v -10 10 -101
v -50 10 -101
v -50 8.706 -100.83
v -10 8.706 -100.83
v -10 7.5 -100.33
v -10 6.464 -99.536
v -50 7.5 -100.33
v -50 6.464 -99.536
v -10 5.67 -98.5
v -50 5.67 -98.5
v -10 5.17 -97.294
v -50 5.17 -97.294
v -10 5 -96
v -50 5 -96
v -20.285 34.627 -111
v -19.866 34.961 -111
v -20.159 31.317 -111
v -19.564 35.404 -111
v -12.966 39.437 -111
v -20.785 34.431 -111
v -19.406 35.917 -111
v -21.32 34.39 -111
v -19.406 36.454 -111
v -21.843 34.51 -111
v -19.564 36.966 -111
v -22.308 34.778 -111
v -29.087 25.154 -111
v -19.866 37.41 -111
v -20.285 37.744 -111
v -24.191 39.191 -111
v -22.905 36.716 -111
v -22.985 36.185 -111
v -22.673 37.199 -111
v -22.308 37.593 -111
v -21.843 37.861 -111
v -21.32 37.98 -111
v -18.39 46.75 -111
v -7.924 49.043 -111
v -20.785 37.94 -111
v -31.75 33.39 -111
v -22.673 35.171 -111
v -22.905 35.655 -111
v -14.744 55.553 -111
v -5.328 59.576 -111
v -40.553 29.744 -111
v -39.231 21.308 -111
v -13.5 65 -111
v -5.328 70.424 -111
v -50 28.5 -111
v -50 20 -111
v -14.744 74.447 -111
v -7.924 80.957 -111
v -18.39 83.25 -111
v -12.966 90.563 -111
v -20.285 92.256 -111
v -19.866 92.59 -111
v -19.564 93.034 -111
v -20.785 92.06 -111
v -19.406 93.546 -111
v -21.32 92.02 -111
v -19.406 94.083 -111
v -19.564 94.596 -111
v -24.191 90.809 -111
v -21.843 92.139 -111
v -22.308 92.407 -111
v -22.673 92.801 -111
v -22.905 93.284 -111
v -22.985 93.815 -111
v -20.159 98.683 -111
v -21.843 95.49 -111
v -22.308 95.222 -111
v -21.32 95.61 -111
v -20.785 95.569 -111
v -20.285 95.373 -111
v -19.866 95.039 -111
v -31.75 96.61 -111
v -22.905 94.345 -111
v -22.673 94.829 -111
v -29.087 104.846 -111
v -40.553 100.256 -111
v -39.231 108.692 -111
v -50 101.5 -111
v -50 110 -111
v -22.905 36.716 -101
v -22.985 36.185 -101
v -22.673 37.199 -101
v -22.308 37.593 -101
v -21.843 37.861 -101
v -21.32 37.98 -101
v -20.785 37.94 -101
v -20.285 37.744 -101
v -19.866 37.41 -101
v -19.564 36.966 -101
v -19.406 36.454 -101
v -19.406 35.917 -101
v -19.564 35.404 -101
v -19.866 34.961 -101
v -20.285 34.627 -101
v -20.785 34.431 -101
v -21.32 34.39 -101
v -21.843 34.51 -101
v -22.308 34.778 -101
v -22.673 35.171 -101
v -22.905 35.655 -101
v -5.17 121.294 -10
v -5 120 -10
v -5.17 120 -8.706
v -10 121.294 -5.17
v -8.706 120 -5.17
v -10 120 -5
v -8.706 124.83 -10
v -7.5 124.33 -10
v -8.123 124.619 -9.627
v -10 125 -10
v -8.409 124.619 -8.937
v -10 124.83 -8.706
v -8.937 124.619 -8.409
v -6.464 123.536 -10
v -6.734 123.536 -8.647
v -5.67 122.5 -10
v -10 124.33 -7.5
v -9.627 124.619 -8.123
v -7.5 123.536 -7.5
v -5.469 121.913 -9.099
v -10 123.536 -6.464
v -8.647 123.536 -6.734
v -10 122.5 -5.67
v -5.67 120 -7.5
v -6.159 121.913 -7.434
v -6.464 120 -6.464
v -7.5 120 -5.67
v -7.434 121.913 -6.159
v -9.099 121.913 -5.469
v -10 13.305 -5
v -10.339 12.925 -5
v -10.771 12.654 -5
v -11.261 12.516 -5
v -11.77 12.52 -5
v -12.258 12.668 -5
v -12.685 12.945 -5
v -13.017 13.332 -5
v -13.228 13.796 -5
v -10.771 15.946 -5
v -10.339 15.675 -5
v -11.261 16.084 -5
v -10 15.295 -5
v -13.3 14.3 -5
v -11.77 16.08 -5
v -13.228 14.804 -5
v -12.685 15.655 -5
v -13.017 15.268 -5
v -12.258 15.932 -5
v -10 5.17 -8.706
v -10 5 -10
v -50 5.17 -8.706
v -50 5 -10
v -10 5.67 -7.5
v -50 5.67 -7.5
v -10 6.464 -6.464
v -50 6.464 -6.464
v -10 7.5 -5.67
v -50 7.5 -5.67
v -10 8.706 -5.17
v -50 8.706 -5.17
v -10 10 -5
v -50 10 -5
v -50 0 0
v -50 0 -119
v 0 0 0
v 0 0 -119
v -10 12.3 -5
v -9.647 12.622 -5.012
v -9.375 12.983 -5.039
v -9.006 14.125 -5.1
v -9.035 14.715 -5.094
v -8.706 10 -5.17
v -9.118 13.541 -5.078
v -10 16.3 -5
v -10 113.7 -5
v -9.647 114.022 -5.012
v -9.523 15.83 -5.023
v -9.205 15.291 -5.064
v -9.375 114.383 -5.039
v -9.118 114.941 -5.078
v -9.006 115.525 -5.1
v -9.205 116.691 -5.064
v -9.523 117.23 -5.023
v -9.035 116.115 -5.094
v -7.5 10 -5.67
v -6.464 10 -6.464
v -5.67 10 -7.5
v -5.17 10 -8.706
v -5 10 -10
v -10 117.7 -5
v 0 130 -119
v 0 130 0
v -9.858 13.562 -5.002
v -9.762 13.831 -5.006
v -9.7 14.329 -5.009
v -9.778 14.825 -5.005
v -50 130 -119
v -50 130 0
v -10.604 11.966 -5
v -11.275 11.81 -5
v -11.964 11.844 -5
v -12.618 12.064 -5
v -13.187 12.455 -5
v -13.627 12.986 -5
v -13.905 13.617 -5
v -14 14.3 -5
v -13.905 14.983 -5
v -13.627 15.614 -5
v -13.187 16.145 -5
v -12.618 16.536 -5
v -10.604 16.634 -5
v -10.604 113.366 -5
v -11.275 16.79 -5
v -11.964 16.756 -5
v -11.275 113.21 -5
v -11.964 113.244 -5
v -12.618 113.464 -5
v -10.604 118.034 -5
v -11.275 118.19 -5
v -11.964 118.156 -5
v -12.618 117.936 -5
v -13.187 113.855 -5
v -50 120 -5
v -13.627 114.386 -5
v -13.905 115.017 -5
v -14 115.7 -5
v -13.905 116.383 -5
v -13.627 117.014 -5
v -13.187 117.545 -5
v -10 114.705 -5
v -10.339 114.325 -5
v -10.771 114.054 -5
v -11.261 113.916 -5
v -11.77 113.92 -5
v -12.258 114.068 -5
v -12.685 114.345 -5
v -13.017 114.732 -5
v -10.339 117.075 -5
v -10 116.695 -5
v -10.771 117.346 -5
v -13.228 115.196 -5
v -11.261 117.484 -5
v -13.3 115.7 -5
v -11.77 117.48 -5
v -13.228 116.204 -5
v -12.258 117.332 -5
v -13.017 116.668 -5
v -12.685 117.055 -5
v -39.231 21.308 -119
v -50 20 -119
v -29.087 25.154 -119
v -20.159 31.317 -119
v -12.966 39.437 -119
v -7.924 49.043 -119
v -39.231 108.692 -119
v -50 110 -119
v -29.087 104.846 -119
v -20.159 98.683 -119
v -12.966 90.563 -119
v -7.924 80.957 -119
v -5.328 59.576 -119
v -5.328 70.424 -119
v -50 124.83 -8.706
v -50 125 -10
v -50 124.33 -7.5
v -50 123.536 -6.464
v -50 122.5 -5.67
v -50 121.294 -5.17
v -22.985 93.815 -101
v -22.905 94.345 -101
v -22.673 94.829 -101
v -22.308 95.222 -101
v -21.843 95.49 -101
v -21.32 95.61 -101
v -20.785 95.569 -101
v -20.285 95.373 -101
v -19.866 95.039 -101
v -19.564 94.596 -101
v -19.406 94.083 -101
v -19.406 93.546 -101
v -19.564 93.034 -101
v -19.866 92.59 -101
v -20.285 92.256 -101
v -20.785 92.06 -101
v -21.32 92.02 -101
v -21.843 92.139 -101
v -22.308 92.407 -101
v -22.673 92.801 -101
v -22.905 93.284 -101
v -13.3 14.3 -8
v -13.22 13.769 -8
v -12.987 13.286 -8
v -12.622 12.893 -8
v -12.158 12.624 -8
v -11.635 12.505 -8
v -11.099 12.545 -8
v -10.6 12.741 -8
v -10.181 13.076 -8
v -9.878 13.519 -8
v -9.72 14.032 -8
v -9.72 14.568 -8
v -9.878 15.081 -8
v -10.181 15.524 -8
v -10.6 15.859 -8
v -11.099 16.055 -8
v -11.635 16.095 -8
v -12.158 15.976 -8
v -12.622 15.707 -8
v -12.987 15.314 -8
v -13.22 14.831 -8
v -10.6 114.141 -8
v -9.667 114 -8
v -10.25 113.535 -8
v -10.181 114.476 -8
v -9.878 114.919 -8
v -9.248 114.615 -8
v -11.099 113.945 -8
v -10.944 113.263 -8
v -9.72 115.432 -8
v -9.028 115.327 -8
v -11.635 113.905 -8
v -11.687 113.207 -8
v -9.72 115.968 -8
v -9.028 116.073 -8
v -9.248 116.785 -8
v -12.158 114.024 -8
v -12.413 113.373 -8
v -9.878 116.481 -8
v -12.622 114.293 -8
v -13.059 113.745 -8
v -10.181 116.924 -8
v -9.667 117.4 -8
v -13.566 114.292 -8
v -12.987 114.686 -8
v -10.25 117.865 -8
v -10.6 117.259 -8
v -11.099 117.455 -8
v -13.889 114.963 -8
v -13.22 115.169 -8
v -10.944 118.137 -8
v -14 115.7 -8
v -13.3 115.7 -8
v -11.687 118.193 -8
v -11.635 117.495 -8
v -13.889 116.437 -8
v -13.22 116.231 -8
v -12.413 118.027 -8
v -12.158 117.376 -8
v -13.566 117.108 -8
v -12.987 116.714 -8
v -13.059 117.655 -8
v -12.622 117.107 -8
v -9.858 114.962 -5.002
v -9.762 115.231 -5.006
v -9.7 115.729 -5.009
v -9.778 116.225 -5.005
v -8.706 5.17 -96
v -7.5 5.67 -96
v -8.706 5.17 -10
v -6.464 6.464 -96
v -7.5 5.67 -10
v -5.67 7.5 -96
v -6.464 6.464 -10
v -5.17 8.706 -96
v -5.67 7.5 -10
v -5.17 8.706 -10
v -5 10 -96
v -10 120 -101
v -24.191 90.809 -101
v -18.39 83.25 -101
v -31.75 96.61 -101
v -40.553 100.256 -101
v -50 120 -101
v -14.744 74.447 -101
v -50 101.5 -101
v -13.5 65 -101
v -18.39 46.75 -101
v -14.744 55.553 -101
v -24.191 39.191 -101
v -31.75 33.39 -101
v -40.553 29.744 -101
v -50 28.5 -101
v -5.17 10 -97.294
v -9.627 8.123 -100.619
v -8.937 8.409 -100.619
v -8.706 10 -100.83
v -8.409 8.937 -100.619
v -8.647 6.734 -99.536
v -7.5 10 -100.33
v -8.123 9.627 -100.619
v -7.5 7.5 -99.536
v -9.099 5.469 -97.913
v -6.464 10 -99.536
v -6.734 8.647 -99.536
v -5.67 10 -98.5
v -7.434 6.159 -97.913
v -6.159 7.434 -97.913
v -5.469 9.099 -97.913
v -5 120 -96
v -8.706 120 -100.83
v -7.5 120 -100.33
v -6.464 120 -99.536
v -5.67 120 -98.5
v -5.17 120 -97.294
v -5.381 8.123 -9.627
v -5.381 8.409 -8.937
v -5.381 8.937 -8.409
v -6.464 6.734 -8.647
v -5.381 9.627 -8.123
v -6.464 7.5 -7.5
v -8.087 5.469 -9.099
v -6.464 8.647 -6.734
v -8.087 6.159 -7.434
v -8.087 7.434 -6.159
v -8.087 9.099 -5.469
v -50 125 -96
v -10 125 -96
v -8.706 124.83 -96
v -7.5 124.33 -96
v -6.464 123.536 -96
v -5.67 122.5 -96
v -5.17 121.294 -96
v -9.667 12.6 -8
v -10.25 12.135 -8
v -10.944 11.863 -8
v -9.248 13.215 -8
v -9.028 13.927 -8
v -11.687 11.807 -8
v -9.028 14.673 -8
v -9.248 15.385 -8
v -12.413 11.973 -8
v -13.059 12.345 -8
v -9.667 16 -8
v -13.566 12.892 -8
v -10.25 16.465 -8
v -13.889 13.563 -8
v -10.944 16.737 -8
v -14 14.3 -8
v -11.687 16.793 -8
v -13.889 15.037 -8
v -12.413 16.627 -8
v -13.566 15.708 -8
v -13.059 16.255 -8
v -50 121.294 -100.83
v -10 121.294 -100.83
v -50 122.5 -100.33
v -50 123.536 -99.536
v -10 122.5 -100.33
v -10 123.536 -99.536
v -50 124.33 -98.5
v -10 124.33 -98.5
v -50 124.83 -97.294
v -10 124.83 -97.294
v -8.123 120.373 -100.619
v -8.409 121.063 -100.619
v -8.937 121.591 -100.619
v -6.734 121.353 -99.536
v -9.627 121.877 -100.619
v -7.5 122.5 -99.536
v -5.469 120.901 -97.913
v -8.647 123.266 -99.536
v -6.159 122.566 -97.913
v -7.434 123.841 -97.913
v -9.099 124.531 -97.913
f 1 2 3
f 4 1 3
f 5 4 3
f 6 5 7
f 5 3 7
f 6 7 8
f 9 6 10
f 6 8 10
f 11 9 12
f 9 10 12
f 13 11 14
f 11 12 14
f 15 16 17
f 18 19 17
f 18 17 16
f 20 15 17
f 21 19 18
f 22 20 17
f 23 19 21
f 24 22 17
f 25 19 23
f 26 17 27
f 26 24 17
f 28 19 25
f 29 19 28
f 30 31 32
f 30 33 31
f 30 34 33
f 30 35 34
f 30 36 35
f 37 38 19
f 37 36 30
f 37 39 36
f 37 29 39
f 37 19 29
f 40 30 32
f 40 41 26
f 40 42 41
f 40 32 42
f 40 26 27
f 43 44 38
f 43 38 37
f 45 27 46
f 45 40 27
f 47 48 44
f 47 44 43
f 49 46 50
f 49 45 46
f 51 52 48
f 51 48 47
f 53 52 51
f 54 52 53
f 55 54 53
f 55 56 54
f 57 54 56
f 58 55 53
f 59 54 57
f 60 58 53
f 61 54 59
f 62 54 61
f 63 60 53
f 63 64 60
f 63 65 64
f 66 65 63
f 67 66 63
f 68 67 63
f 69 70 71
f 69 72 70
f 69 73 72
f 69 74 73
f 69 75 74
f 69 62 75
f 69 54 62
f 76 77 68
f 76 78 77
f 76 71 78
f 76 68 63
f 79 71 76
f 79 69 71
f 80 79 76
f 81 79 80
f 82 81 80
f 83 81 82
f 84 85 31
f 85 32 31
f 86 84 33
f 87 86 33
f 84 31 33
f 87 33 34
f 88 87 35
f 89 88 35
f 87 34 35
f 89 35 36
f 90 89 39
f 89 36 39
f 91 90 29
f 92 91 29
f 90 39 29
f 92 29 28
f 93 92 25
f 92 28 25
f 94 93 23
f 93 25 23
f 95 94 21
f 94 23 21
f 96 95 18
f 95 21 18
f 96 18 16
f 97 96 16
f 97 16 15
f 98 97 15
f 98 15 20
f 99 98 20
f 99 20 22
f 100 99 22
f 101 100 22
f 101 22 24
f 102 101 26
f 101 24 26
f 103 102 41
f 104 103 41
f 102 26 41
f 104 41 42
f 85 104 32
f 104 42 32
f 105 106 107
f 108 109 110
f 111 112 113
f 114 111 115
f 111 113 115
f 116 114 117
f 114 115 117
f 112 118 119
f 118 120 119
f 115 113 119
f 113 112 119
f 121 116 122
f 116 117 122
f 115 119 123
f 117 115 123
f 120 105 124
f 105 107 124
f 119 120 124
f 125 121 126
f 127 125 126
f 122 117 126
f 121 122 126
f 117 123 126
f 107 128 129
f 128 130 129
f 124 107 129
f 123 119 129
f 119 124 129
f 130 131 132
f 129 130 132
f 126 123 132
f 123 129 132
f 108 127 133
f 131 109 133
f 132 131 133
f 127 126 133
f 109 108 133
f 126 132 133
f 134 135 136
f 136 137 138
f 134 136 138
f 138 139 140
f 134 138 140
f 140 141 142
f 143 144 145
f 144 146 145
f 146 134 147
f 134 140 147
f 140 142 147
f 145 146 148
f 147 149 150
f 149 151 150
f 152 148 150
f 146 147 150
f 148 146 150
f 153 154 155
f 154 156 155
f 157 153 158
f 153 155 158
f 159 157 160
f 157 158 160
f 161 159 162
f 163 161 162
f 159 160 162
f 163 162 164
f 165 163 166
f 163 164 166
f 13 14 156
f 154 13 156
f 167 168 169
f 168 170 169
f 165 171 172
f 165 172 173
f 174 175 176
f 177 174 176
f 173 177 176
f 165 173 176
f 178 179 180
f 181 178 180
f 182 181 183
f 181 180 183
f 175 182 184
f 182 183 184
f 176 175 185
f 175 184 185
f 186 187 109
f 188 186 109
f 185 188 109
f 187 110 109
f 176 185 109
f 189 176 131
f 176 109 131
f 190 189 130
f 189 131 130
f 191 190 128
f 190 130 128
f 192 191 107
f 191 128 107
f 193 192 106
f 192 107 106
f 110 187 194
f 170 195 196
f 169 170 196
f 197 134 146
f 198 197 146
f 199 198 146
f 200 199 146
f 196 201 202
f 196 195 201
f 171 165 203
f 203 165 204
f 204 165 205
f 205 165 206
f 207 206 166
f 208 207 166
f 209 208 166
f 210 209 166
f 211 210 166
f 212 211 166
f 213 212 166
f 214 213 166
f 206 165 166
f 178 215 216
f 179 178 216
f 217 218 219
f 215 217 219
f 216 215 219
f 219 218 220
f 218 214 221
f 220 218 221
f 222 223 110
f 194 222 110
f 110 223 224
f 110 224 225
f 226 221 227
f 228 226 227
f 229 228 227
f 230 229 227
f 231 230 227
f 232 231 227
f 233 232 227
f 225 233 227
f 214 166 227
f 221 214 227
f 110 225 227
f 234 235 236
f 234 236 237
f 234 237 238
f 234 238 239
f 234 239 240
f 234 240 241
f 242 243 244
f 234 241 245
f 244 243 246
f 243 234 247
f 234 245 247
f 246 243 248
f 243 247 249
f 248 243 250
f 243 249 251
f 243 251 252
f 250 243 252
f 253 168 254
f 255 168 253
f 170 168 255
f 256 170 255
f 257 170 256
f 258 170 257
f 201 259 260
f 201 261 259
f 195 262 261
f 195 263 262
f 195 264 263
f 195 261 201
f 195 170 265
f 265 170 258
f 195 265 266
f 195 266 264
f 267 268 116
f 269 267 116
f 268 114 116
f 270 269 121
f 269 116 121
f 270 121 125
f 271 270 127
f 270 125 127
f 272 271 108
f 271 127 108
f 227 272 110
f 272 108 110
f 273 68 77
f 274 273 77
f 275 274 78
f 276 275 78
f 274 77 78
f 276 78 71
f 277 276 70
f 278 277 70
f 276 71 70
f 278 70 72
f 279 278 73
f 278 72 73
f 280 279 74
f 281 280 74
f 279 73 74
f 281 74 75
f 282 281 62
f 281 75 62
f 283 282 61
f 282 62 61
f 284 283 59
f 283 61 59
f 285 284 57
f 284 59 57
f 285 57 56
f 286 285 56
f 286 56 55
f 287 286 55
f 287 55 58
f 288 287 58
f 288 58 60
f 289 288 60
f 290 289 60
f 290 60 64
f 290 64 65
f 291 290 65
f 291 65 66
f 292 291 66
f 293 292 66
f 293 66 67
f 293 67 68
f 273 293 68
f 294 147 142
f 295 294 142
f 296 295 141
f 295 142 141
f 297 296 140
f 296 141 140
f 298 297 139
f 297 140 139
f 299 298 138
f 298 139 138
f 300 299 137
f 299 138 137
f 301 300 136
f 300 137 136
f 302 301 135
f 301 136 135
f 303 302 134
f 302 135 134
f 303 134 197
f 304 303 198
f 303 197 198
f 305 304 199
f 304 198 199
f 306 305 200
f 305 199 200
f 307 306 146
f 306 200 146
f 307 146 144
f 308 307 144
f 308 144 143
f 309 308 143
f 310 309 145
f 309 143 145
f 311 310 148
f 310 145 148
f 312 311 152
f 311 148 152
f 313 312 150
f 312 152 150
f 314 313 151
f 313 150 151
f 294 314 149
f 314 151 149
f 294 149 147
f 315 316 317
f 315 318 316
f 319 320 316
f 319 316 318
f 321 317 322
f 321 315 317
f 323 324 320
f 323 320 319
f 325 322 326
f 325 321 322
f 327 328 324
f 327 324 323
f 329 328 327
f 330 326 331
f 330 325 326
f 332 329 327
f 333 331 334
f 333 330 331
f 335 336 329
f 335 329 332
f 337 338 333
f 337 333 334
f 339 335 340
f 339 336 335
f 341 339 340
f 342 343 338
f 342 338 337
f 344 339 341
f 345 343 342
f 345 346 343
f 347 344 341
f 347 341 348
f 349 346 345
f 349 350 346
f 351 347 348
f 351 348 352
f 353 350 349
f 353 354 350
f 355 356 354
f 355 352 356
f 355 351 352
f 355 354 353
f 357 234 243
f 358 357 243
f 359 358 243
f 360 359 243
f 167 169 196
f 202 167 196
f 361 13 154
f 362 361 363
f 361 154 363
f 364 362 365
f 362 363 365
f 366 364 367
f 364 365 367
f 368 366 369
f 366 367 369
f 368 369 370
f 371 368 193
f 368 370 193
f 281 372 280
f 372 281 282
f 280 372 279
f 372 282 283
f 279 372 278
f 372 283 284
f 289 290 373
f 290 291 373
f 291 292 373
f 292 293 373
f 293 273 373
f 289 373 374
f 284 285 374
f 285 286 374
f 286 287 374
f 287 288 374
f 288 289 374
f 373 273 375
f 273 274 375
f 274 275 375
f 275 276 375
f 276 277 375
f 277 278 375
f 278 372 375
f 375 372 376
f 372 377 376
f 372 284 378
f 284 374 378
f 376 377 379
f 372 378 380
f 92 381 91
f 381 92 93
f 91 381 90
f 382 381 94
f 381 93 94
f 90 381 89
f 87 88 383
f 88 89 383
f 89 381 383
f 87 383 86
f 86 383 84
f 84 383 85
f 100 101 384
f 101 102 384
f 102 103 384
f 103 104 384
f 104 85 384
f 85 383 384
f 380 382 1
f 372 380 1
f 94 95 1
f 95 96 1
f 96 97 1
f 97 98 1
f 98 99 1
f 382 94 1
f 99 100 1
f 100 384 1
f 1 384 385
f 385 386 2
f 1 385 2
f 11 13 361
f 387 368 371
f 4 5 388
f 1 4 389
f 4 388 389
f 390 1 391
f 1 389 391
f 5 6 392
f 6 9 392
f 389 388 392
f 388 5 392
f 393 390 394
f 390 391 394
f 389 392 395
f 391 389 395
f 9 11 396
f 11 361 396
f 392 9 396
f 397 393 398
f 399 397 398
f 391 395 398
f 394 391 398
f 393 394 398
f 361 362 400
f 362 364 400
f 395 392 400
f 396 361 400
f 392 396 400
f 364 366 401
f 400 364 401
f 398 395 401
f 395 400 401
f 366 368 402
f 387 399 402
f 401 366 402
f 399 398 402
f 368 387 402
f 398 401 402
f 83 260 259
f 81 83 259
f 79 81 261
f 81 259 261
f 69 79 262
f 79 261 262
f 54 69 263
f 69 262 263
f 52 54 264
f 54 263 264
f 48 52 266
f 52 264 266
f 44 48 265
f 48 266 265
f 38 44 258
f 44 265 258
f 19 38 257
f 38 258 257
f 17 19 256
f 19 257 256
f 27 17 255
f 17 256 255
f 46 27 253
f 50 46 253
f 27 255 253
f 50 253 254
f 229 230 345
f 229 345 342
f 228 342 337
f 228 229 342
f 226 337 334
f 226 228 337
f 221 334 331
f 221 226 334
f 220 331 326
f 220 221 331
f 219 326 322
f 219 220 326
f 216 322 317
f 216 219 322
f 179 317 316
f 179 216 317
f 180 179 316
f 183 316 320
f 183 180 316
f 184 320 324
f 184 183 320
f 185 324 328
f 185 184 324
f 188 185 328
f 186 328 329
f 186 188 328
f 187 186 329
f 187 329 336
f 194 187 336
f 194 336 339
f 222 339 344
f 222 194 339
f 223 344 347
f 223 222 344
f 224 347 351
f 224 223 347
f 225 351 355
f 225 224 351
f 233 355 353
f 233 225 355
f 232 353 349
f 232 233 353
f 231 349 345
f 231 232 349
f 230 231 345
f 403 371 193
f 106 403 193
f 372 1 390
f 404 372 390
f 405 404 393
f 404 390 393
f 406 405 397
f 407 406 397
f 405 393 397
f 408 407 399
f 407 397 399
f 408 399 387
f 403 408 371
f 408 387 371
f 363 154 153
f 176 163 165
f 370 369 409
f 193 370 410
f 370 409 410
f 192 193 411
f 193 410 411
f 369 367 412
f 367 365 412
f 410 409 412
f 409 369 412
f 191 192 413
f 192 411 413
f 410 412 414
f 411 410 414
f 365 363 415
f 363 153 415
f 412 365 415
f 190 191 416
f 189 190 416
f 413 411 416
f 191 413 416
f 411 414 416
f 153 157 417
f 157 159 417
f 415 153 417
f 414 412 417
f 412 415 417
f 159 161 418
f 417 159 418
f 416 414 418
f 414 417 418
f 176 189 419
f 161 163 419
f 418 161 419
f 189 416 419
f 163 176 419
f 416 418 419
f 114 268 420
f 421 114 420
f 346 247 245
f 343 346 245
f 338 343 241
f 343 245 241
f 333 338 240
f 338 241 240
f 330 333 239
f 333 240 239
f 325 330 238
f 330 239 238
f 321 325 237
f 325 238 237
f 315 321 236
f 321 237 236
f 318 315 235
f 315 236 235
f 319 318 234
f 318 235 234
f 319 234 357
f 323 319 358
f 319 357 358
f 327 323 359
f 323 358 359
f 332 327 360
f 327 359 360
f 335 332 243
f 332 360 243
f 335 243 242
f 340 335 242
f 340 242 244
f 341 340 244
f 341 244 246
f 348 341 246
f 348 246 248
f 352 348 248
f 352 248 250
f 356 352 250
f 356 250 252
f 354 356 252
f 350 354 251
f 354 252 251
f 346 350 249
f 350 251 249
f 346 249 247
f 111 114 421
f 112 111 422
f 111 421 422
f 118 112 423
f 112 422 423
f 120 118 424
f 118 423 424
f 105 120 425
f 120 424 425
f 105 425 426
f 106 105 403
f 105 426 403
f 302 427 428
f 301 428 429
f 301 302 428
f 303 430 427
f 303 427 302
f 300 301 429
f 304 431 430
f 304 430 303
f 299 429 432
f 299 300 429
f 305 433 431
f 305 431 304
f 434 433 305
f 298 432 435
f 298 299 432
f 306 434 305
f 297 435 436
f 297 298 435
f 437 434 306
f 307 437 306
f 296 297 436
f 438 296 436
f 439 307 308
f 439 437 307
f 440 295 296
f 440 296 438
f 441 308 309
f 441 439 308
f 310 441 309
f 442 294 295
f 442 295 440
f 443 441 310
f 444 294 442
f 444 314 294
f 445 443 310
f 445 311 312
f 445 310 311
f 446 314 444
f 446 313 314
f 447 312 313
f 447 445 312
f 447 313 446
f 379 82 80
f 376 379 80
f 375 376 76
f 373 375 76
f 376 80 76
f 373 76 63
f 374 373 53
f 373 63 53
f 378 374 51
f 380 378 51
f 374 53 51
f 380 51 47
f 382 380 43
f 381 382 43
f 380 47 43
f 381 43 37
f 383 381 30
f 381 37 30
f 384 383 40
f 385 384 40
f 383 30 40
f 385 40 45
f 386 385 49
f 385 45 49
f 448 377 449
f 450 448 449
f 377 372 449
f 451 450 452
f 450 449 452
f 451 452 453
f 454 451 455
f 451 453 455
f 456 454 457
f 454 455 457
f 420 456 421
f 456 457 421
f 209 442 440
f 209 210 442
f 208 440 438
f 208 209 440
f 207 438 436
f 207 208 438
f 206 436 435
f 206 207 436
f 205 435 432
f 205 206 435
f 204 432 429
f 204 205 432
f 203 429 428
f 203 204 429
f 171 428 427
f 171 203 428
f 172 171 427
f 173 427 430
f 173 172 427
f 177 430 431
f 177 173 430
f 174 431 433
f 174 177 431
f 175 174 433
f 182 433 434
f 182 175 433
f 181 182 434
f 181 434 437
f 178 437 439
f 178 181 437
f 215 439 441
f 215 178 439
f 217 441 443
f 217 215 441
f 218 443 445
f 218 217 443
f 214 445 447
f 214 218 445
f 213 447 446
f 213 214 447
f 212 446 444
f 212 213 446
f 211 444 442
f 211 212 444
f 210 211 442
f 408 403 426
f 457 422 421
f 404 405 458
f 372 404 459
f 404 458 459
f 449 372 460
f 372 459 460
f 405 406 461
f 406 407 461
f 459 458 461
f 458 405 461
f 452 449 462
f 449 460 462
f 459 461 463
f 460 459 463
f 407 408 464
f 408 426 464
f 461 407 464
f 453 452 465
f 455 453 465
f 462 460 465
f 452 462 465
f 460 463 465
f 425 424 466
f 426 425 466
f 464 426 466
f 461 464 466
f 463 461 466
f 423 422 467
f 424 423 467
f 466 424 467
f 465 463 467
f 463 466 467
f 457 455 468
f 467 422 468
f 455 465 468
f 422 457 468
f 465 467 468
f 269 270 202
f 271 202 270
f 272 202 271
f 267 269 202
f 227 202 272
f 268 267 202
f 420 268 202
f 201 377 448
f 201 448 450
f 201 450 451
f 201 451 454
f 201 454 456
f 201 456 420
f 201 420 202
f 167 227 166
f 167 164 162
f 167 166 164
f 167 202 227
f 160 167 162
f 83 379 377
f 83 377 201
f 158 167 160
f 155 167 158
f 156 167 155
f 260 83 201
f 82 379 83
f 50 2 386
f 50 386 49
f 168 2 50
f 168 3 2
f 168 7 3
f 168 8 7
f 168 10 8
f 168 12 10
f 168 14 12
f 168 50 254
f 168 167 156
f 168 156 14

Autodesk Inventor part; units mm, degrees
ref_plane "YZ Plane" through (0, 0, 0) normal (1, 0, 0) x (0, 1, 0)
ref_plane "XZ Plane" through (0, 0, 0) normal (0, 1, 0) x (-1, 0, 0)
sketch "Sketch1" plane through (0, 0, 0) normal (0, 1, 0) x (-1, 0, 0)
  line L0 (0, 0) -> (100, 0)
  line L1 (100, 0) -> (100, -119)
  line L2 (100, -119) -> (0, -119)
  line L3 (0, -119) -> (0, 0)
  dimension "d0" = 119
  dimension "d1" = 100
extrude "Extrusion1" add sketch "Sketch1" along normal blind 130
sketch "Sketch2" plane through (0, 0, -119) normal (0, 0, -1) x (-1, 0, 0)
  circle A0 centre (50, 65) radius 45
  line L0 (100, 0) -> (100, 130) projected
  line L1 (0, 0) -> (0, 130) projected
  line L2 (0, 0) -> (100, 0) projected
  line L3 (0, 130) -> (100, 130) projected
  circle A1 centre (50, 65) radius 36.5
  circle A2 centre (28.0236, 99.1226) radius 1.9
  line L4 (25.6342, 102.8326) -> (74.3658, 27.1674) construction
  line L5 (12.1674, 40.6342) -> (87.8326, 89.3658) construction
  dimension "d6" = 90
  dimension "d7" = 100
  dimension "d8" = 50
  dimension "d9" = 65
  dimension "d10" = 130
  dimension "d11" = 73
  dimension "d12" = 3.8
extrude "Extrusion2" cut sketch "Sketch2" against normal blind 8 contours A0 | A1 | A2
extrude "Extrusion3" cut sketch "Sketch2" against normal blind 18 contours A1
ref_plane "Work Plane1" through (-95, 0, -119) normal (-1, 0, 0) x (0, 0, 1)
sketch "Sketch3" plane through (-95, 0, -119) normal (-1, 0, 0) x (0, 0, 1)
  line L0 (18, 28.5) -> (18, 101.5) projected
  line L1 (119, 130) -> (119, 0) projected
  line L2 (119, 0) -> (0, 0) projected
  line L3 (0, 0) -> (0, 65) projected
  line L4 (8, 65) -> (0, 65) projected
  line L5 (0, 130) -> (119, 130) projected
  line L6 (0, 65) -> (0, 130) projected
  line L7 (114, 125) -> (18, 125)
  line L8 (18, 125) -> (18, 5)
  line L9 (18, 5) -> (114, 5)
  line L10 (114, 5) -> (114, 125)
  dimension "d16" = 5
  dimension "d17" = 5
  dimension "d18" = 5
extrude "Extrusion4" cut sketch "Sketch3" against normal blind 90 and the other way blind 90 contours L0 L8 L7 L10 L9
fillet "Fillet1" radius 5 8 edges at (-52.5, 5, -5) (-5, 5, -53) (-5, 65, -5) (-5, 125, -53) (-52.5, 125, -5) (-52.5, 5, -101) (-52.5, 125, -101) (-5, 65, -101)
sketch "Sketch8" plane through (-100, 0, -119) normal (-1, 0, 0) x (0, 0, 1)
  point P0 (119, 0)
sketch "Sketch10" plane through (-100, 0, -119) normal (-1, 0, 0) x (0, 0, 1)
  line L0 (0, 0) -> (119, 0) projected
  line L1 (119, 0) -> (119, 130) projected
  line L2 (0, 130) -> (119, 130) projected
  line L3 (0, 0) -> (0, 130) projected
extrude "Extrusion10" add sketch "Sketch10" along normal blind 5
sketch "Sketch12" plane through (0, 130, 0) normal (0, 1, 0) x (1, 0, 0)
  line L0 (0, 119) -> (-105, 119) projected
  line L1 (-105, 0) -> (-105, 119) projected
  line L2 (0, 0) -> (-105, 0) projected
  line L3 (0, 0) -> (0, 119) projected
  line L4 (-105, 0) -> (-100, 0)
  line L5 (-100, 0) -> (-100, 119)
  line L6 (-100, 119) -> (-105, 119)
  line L7 (-105, 119) -> (-105, 0)
  line L8 (-100, 20) -> (-105, 25)
  line L9 (-105, 40) -> (-100, 45)
  line L10 (-105, 94) -> (-100, 99)
  line L11 (-100, 74) -> (-105, 79)
  dimension "d82" = 119
  dimension "d86" = 5
  dimension "d87" = 45
  dimension "d88" = 45
  dimension "d90" = 45
  dimension "d91" = 45
  dimension "d92" = 20
  dimension "d93" = 25
  dimension "d94" = 20
  dimension "d95" = 25
extrude "Extrusion11" cut sketch "Sketch12" against normal blind 127 contours L5 L11 L1 L10 | L8 L1 L9 L5
fillet "Fillet2" radius 1 8 edges at (-105, 66.5, -25) (-100, 127.5, -20) (-105, 66.5, -40) (-100, 127.5, -45) (-105, 66.5, -79) (-100, 127.5, -74) (-105, 66.5, -94) (-100, 127, -99)
sketch "Sketch13" plane through (-10, 120, -5) normal (0, 0, -1) x (-1, 0, 0)
  line L0 (82.5, 0) -> (-2.5, 0)
  line L1 (-2.5, 0) -> (-2.5, -110)
  line L2 (-2.5, -110) -> (82.5, -110)
  line L3 (82.5, -110) -> (82.5, 0)
  line L4 (-5, 0) -> (-5, -110) projected
  line L5 (85, -110) -> (85, 0) projected
  circle A0 centre (78.5, -4.3) radius 1.8
  circle A1 centre (78.5, -4.3) radius 2.5
  line L6 (78.5, -4.3) -> (78.5, -140.0823) construction
  line L7 (78.5, -4.3) -> (-34.9987, -4.3) construction
  line L8 (1.5, 27.6777) -> (1.5, -220.2724) construction
  line L9 (-45.8754, -105.7) -> (99.6232, -105.7) construction
  line L10 (80, 5) -> (0, 5) construction
  line L11 (0, -115) -> (80, -115) construction
  circle A2 centre (78.5, -105.7) radius 1.8
  circle A3 centre (78.5, -105.7) radius 2.5
  circle A4 centre (1.5, -105.7) radius 1.8
  circle A5 centre (1.5, -105.7) radius 2.5
  circle A6 centre (1.5, -4.3) radius 1.8
  circle A7 centre (1.5, -4.3) radius 2.5
  point P0 (-10, -120)
  dimension "d97" = 85
  dimension "d98" = 110
  dimension "d99" = 90
  dimension "d100" = 2.5
  dimension "d101" = 4
  dimension "d102" = 4.3
  dimension "d103" = 3.6
  dimension "d104" = 5
  dimension "d105" = 4.3
  dimension "d107" = 120
  dimension "d108" = 5
  dimension "d109" = 4
  dimension "d110" = 3.6
  dimension "d111" = 5
  dimension "d112" = 3.6
  dimension "d113" = 5
  dimension "d114" = 3.6
  dimension "d115" = 5
extrude "Extrusion12" add sketch "Sketch13" along normal blind 3 contours A1 | A3 | A5 | A7
sketch "Sketch14" plane through (-105, 0, -119) normal (-1, 0, 0) x (0, 0, 1)
  line L0 (19.5, 52) -> (19.5, 34) construction
  line L1 (18, 52) -> (18, 34)
  line L2 (21, 34) -> (21, 52)
  arc A0 (21, 52) -> (18, 52) centre (19.5, 52) ccw
  arc A1 (18, 34) -> (21, 34) centre (19.5, 34) ccw
  line L3 (0, 130) -> (0, 0) projected
  line L4 (0, 0) -> (119, 0) projected
  point P0 (19.5, 43)
  dimension "d118" = 18
  dimension "d119" = 3
  dimension "d121" = 18
  dimension "d122" = 34
extrude "Extrusion13" cut sketch "Sketch14" against normal blind 20
sketch "Sketch15" plane through (-50, 65, -111) normal (0, 0, -1) x (-1, 0, 0)
  circle A0 centre (0, 0) radius 45 construction
  line L0 (31.8198, 31.8198) -> (-31.8198, -31.8198) construction
  line L1 (31.8198, -31.8198) -> (-31.8198, 31.8198) construction
  circle A1 centre (0, 0) radius 36.5 construction
  circle A2 centre (0, 0) radius 40.75 construction
  line L2 (0, -45) -> (0, 45) construction
  line L3 (-40, -60) -> (40, -60) construction
  circle A3 centre (28.8146, 28.8146) radius 1.8
  circle A4 centre (-28.8146, 28.8146) radius 1.8
  circle A5 centre (28.8146, -28.8146) radius 1.8
  circle A6 centre (-28.8146, -28.8146) radius 1.8
  point P0 (-50, -65)
  dimension "d125" = 45
  dimension "d126" = 73
  dimension "d129" = 90
  dimension "d130" = 4.25
  dimension "d131" = 3.6
  dimension "d135" = 3.6
  dimension "d136" = 3.6
  dimension "d137" = 3.6
extrude "Extrusion14" cut sketch "Sketch15" against normal blind 40
ref_plane "Work Plane2" through (-50, 0, -119) normal (-1, 0, 0) x (0, 0, 1)
split "Split1" plane through (-50, 0, -119) removes the side toward (-1, 0, 0)
sketch "Sketch18" plane through (-50, 0, -119) normal (-1, 0, 0) x (0, 0, 1)
  line L0 (8, 110) -> (0, 110) projected
  line L1 (8, 101.5) -> (8, 110) projected
  line L2 (18, 101.5) -> (8, 101.5) projected
  line L3 (18, 120) -> (18, 101.5) projected
  arc A0 (23, 125) -> (18, 120) centre (23, 120) ccw projected
  line L4 (109, 125) -> (23, 125) projected
  arc A1 (114, 120) -> (109, 125) centre (109, 120) ccw projected
  line L5 (114, 10) -> (114, 120) projected
  arc A2 (109, 5) -> (114, 10) centre (109, 10) ccw projected
  line L6 (23, 5) -> (109, 5) projected
  arc A3 (18, 10) -> (23, 5) centre (23, 10) ccw projected
  line L7 (18, 28.5) -> (18, 10) projected
  line L8 (8, 28.5) -> (18, 28.5) projected
  line L9 (8, 20) -> (8, 28.5) projected
  line L10 (0, 20) -> (8, 20) projected
  line L11 (0, 0) -> (0, 20) projected
  line L12 (119, 0) -> (0, 0) projected
  line L13 (119, 130) -> (119, 0) projected
  line L14 (0, 130) -> (119, 130) projected
  line L15 (0, 110) -> (0, 130) projected
  line L16 (117.7, 1.3) -> (1.3, 1.3)
  line L17 (1.3, 1.3) -> (1.3, 18.7)
  line L18 (1.3, 18.7) -> (9.3, 18.7)
  line L19 (9.3, 18.7) -> (9.3, 27.2)
  line L20 (9.3, 27.2) -> (16.7, 27.2)
  line L21 (16.7, 27.2) -> (16.7, 10)
  arc A4 (16.7, 10) -> (23, 3.7) centre (23, 10) ccw
  line L22 (23, 3.7) -> (109, 3.7)
  arc A5 (109, 3.7) -> (115.3, 10) centre (109, 10) ccw
  line L23 (115.3, 10) -> (115.3, 120)
  arc A6 (115.3, 120) -> (109, 126.3) centre (109, 120) ccw
  line L24 (109, 126.3) -> (23, 126.3)
  arc A7 (23, 126.3) -> (16.7, 120) centre (23, 120) ccw
  line L25 (16.7, 120) -> (16.7, 102.8)
  line L26 (16.7, 102.8) -> (9.3, 102.8)
  line L27 (9.3, 102.8) -> (9.3, 111.3)
  line L28 (9.3, 111.3) -> (1.3, 111.3)
  line L29 (1.3, 111.3) -> (1.3, 128.7)
  line L30 (1.3, 128.7) -> (117.7, 128.7)
  line L31 (117.7, 128.7) -> (117.7, 1.3)
  dimension "d140" = 1.3
equation "\"d8\" = 0.5 * d7"
equation "\"d9\" = 0.5 * d10"
equation "\"d100\" = -0.5 * d97 + 0.5 * d99"
equation "\"d108\" = -0.5 * d98 + 0.5 * d107"
equation "\"d130\" = -0.25 * d126 + 0.25 * d129"
equation "\"d135\" = d131"
equation "\"d136\" = d131"
equation "\"d137\" = d131"
properties part number "wooferBox"
